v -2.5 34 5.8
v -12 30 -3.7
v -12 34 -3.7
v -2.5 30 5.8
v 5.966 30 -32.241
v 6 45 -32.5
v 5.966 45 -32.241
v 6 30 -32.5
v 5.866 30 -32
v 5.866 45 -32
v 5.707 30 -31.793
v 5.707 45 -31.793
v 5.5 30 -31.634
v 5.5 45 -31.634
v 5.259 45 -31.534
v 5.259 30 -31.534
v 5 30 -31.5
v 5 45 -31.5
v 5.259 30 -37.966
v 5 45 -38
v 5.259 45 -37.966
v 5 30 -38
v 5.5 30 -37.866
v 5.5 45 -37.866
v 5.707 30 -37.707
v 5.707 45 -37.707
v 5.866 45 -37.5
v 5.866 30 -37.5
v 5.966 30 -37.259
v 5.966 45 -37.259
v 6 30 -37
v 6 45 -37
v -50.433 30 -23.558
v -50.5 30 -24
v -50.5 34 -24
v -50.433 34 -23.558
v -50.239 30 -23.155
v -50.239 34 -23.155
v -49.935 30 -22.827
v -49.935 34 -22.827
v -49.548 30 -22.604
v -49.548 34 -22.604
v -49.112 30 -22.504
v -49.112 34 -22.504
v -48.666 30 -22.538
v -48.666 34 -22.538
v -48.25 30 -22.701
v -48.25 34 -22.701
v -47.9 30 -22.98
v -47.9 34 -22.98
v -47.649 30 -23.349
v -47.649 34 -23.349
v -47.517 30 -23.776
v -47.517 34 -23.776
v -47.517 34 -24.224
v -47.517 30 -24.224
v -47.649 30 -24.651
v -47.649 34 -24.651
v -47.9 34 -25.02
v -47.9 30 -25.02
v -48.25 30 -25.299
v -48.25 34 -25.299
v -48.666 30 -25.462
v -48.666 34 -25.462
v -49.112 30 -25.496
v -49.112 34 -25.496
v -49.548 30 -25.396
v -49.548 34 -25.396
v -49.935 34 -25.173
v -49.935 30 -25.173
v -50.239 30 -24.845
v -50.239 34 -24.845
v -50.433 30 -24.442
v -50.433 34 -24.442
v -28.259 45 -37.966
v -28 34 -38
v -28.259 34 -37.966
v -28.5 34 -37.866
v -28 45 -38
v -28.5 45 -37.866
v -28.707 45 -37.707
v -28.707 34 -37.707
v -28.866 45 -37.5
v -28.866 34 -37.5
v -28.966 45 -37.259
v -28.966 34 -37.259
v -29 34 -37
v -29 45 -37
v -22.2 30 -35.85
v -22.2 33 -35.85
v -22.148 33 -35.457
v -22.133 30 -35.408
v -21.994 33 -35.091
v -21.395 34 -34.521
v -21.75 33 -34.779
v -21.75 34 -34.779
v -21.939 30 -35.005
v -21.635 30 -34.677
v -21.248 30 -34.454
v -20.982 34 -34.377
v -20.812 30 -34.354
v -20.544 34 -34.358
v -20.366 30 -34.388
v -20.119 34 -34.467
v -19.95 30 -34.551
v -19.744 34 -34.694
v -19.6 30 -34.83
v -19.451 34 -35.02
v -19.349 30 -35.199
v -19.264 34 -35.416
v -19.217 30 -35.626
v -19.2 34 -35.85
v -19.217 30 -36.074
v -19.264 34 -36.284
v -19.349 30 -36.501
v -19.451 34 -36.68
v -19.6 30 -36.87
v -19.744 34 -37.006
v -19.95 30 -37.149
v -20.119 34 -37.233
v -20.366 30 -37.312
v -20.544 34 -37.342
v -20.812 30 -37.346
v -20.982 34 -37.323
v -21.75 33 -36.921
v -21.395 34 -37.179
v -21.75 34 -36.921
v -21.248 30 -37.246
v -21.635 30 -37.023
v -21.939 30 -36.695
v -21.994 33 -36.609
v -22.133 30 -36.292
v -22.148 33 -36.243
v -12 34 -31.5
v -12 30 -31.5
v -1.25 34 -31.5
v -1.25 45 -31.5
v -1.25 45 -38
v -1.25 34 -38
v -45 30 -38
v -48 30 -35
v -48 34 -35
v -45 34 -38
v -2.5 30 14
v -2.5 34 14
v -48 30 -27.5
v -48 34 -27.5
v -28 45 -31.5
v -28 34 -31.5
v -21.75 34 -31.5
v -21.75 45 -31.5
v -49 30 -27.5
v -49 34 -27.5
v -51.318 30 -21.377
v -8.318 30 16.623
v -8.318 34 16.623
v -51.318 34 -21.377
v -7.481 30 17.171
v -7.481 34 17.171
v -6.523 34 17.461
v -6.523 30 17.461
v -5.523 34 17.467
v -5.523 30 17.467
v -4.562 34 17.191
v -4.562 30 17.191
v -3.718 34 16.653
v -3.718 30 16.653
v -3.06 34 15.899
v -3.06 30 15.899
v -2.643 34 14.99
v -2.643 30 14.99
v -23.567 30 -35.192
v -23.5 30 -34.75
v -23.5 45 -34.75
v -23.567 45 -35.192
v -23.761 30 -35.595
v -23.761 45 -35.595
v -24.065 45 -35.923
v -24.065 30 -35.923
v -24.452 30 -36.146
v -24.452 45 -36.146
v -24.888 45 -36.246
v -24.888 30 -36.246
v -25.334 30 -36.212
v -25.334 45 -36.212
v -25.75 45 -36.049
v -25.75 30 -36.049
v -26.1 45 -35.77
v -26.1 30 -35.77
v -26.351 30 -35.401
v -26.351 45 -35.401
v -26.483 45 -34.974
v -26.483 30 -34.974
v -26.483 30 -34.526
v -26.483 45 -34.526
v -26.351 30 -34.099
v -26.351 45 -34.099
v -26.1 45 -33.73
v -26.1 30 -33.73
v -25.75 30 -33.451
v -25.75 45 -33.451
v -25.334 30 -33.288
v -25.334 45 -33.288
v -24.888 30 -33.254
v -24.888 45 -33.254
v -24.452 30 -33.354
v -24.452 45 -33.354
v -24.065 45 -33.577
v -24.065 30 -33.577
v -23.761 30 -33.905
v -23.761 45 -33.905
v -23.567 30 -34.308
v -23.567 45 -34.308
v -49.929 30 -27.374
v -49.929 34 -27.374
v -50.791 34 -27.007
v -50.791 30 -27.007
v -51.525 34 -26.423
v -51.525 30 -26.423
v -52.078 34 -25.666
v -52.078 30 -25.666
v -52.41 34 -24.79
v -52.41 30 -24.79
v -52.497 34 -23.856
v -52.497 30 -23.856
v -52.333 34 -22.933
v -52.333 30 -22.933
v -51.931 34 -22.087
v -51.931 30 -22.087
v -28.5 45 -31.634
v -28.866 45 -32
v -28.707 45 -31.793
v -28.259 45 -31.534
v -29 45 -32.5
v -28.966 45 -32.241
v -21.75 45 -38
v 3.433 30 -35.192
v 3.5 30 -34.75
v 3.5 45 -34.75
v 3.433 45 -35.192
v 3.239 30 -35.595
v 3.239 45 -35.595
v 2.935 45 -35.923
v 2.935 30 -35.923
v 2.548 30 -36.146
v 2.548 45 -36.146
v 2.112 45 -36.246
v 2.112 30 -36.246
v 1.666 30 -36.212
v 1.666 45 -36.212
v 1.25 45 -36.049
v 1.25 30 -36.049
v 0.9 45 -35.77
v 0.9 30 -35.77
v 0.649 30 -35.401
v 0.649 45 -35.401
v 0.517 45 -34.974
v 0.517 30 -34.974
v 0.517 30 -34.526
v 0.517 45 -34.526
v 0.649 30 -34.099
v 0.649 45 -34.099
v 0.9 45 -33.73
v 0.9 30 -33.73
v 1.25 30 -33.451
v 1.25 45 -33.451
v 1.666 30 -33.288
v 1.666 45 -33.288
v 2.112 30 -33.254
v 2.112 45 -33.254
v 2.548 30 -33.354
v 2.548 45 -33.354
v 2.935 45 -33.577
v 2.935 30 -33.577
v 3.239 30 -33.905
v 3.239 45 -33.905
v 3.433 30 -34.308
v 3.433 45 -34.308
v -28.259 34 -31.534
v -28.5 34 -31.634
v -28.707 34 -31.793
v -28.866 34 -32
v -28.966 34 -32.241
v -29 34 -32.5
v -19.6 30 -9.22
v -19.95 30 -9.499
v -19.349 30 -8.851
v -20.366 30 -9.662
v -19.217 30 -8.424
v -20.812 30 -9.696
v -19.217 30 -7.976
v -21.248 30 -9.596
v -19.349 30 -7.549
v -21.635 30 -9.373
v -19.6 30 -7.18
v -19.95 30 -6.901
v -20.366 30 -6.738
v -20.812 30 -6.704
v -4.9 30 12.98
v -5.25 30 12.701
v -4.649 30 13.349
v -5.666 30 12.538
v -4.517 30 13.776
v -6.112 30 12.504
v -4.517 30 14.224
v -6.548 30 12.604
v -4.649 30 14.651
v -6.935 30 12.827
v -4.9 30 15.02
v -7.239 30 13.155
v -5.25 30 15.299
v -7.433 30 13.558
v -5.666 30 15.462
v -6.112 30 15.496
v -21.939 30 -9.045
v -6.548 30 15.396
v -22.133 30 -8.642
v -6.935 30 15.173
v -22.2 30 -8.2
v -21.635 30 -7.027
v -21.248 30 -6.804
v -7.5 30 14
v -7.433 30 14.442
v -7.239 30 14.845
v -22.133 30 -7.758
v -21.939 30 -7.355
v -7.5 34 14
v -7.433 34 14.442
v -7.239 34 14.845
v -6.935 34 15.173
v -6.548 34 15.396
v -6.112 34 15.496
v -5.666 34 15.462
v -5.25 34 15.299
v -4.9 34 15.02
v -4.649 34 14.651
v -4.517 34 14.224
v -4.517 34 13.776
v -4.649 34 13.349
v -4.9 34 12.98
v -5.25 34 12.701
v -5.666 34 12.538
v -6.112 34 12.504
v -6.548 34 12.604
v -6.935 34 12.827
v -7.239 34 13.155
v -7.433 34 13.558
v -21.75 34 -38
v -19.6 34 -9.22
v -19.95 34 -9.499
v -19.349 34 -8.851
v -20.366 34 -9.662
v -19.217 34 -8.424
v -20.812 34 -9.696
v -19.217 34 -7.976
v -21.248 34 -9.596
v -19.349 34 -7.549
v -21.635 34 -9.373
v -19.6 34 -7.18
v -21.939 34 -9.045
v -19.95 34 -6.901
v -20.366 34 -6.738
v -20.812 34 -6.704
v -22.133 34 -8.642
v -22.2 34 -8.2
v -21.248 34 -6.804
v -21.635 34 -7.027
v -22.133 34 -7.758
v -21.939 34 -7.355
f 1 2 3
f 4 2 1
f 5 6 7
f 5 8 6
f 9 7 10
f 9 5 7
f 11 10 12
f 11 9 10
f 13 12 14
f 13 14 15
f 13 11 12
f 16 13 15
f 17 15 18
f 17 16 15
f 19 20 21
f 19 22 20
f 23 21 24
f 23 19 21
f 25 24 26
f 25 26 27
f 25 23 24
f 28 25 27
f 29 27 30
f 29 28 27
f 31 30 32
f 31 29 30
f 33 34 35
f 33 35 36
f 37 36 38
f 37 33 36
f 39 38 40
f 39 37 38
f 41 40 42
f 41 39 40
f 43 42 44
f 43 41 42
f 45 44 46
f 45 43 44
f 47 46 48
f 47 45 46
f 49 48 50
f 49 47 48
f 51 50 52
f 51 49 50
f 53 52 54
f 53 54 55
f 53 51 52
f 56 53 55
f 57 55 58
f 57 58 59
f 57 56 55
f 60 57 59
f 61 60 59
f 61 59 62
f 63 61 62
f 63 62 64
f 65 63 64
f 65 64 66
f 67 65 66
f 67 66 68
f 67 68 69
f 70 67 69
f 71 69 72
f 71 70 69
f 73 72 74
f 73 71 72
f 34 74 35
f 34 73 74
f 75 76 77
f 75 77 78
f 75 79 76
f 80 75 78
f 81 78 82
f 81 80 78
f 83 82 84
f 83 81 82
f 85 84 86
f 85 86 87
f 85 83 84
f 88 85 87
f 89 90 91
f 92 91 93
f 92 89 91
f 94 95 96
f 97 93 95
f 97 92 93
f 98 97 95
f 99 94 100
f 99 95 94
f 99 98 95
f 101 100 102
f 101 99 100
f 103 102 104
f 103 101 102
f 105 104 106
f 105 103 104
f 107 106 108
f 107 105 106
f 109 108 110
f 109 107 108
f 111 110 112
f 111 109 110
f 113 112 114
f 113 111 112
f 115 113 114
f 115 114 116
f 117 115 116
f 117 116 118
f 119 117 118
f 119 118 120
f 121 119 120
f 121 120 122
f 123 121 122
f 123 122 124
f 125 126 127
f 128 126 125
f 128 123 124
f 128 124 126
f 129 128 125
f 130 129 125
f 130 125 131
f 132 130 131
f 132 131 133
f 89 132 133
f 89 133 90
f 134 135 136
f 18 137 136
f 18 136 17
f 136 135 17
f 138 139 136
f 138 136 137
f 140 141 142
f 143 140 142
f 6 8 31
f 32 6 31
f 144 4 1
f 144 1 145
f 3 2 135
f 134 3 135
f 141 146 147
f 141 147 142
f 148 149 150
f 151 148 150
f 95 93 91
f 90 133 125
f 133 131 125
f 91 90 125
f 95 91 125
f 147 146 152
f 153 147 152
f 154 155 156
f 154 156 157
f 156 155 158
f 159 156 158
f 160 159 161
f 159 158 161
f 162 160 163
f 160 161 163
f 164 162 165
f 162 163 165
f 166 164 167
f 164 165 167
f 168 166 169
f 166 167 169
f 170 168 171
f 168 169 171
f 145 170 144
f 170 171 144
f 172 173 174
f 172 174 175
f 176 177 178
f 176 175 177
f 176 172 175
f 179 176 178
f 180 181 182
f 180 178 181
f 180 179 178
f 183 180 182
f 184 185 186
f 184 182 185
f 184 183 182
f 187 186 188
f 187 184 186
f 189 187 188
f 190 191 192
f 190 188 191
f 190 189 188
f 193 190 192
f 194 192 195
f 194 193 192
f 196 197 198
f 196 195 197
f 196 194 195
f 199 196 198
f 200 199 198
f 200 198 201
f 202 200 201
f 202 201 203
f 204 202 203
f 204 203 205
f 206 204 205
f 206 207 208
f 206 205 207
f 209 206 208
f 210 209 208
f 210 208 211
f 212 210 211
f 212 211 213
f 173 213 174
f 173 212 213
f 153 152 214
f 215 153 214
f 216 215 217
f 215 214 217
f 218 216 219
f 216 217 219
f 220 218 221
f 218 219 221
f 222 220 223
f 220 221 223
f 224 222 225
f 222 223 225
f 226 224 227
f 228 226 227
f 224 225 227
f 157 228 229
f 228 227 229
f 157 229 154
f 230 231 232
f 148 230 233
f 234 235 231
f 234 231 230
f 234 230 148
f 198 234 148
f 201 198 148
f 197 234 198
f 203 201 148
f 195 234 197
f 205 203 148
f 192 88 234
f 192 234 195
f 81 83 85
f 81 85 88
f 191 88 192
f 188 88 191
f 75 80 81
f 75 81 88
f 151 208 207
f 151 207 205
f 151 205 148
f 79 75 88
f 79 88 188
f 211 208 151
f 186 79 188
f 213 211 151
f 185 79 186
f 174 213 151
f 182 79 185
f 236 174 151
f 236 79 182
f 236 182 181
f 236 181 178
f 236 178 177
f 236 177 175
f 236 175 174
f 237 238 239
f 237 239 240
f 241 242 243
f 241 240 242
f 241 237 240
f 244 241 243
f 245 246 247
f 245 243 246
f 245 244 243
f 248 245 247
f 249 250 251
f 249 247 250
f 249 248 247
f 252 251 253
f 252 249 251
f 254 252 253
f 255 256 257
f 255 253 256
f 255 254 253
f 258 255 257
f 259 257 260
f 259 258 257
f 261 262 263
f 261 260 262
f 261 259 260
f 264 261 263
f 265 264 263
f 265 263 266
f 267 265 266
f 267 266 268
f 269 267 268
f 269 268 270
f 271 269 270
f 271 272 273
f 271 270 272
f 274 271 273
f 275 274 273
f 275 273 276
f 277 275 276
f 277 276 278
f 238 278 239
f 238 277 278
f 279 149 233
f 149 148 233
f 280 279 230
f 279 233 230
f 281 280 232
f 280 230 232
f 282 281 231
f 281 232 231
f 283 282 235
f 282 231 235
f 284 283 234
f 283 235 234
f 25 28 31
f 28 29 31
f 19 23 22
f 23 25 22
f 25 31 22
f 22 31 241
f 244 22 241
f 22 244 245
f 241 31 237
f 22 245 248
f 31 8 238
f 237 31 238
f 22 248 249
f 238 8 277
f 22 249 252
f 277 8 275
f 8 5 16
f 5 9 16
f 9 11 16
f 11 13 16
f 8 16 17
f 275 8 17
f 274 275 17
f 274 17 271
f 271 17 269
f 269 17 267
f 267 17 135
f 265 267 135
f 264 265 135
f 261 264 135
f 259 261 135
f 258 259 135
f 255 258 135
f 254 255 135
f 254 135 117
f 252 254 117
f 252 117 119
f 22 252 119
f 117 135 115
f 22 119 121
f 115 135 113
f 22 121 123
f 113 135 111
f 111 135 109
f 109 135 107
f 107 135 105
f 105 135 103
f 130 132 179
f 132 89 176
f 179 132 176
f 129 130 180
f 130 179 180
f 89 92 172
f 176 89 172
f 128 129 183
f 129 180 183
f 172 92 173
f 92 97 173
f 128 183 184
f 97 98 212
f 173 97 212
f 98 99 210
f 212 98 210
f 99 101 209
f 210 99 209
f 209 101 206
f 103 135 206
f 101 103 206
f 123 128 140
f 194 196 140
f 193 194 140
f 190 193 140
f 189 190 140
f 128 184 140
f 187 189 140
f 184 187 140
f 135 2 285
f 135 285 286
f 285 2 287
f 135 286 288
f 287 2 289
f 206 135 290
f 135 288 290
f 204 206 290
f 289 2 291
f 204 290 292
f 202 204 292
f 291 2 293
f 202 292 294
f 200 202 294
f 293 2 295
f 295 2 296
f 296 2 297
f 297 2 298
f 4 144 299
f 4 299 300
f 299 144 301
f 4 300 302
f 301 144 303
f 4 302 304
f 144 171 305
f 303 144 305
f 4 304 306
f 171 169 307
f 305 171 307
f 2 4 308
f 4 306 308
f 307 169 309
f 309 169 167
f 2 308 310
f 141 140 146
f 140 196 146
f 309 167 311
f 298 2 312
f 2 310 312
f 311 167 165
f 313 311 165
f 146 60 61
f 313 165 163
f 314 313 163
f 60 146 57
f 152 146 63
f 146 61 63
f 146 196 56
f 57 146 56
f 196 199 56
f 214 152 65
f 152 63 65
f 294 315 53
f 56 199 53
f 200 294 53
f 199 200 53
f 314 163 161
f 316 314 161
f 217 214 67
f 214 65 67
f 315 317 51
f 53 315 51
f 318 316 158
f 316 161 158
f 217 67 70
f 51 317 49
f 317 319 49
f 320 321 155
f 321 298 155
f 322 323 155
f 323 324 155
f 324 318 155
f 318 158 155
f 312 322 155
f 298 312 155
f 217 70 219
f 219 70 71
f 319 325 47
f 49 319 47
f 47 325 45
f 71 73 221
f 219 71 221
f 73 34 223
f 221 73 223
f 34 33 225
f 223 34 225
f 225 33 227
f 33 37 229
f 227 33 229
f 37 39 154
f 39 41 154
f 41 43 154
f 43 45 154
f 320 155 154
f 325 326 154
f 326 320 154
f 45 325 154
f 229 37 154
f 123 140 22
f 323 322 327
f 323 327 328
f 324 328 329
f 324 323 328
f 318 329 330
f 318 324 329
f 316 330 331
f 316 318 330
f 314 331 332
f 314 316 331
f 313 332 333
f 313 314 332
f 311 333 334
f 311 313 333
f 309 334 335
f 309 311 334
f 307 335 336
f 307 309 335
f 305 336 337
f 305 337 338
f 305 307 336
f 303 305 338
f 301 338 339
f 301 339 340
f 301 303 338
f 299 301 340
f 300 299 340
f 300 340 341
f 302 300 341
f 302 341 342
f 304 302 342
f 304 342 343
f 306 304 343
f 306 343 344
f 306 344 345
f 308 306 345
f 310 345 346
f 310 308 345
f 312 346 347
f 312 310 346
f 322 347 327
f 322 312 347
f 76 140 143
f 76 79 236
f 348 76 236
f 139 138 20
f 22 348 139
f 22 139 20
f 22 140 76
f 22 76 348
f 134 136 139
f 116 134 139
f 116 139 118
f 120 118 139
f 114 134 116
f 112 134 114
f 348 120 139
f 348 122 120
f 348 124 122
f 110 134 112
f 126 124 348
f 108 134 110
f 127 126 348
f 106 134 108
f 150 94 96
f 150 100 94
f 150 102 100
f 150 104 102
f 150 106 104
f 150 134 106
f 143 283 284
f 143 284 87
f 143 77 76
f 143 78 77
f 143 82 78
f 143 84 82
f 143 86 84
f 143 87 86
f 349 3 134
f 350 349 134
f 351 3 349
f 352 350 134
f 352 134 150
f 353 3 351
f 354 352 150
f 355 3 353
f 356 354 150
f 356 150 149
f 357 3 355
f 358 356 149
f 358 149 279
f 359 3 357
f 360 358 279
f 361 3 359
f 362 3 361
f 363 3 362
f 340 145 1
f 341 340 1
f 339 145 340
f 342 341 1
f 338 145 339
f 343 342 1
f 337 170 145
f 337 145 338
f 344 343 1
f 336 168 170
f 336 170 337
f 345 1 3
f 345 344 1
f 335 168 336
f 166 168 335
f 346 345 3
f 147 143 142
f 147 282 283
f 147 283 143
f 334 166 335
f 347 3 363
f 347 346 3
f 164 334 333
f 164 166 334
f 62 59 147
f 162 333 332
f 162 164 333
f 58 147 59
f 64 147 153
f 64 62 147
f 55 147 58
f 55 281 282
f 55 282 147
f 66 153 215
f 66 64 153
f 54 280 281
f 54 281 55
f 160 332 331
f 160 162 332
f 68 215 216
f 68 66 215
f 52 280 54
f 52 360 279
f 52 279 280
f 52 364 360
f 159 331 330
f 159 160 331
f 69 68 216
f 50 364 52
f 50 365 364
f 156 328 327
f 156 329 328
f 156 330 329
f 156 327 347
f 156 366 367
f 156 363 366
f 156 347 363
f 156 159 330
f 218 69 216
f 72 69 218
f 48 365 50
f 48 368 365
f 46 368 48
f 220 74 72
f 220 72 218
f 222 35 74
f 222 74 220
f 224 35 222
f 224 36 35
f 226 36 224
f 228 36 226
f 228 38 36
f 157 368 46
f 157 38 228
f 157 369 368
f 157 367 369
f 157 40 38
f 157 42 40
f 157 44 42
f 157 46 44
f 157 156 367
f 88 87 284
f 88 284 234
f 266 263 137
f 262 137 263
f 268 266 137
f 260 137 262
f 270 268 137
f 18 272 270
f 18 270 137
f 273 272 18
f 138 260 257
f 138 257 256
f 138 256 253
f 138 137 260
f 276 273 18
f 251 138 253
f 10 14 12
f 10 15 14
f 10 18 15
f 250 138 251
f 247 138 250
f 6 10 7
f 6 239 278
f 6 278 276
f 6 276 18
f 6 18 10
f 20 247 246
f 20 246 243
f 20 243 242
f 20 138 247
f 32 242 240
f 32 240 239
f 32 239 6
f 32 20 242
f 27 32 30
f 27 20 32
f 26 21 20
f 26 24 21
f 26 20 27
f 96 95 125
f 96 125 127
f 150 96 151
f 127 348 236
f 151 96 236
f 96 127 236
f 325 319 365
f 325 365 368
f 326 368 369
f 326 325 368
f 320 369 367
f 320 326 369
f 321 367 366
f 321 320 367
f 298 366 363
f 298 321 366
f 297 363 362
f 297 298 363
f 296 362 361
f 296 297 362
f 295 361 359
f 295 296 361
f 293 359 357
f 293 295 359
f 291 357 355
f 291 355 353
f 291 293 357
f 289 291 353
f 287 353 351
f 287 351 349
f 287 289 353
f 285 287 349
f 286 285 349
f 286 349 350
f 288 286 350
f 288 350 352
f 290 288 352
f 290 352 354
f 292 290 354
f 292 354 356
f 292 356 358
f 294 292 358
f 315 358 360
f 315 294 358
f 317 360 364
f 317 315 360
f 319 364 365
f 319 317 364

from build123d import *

# Parameters (mm, degrees)
CYLINDER035_R          = 1.5
CYLINDER035_DEPTH      = 30
CYLINDER035_ROLL_ANGLE = -90
CYLINDER034_R          = 1.5
CYLINDER034_DEPTH      = 30
CYLINDER034_ROLL_ANGLE = -90
BOX033_W               = 7.25
BOX033_H               = 12
BOX033_DEPTH           = 6.5
BOX032_W               = 7.25
BOX032_H               = 12
BOX032_DEPTH           = 6.5
SKETCH019_R            = 1.5
PAD017_DEPTH           = 4
FILLET027_R            = 1
CHAMFER008_SIZE        = 3


with BuildPart() as cylinder035:
    # Cylinder035 → Cylinder035 (new body)
    with BuildSketch(Plane.XY):
        Circle(CYLINDER035_R)
    extrude(amount=CYLINDER035_DEPTH)


with BuildPart() as cylinder035_1:
    # Cylinder035 roll: moved
    add(cylinder035.part.rotate(Axis((0, 0, 0), (1, 0, 0)), CYLINDER035_ROLL_ANGLE))


with BuildPart() as cylinder035_2:
    # Cylinder035 placement: moved
    add(cylinder035_1.part.moved(Location((-25, 27, -34.75))))


with BuildPart() as fusion031:
    # Cylinder034 → Cylinder034 (new body)
    with BuildSketch(Plane.XY):
        Circle(CYLINDER034_R)
    extrude(amount=CYLINDER034_DEPTH)


with BuildPart() as fusion031_1:
    # Cylinder034 roll: moved
    add(fusion031.part.rotate(Axis((0, 0, 0), (1, 0, 0)), CYLINDER034_ROLL_ANGLE))


with BuildPart() as fusion031_2:
    # Cylinder034 placement: moved
    add(fusion031_1.part.moved(Location((2, 27, -34.75))))

    # Fusion031: union Cylinder035
    add(cylinder035_2.part)


with BuildPart() as cube033:
    # Box033 → Box033 (new body)
    with BuildSketch(Plane(origin=(-29, 33, -38), x_dir=(1, 0, 0), z_dir=(0, 0, 1))):
        with Locations((3.625, 6)):
            Rectangle(BOX033_W, BOX033_H)
    extrude(amount=BOX033_DEPTH)


with BuildPart() as cube032:
    # Box032 → Box032 (new body)
    with BuildSketch(Plane(origin=(-1.25, 33, -38), x_dir=(1, 0, 0), z_dir=(0, 0, 1))):
        with Locations((3.625, 6)):
            Rectangle(BOX032_W, BOX032_H)
    extrude(amount=BOX032_DEPTH)


with BuildPart() as chamfer008:
    # Sketch019 → Pad017 (new body)
    with BuildSketch(Plane(origin=(0, 30, 0), x_dir=(-1, 0, 0), z_dir=(0, 1, 0))):
        with BuildLine():
            ThreePointArc((8.31768, 16.622663), (4.561577, 17.190758), (2.5, 13.999999))
            Line((2.5, 5.8), (2.5, 13.999999))
            Line((12, -3.7), (2.5, 5.8))
            Line((12, -3.7), (12, -31.5))
            Line((12, -31.5), (-6, -31.5))
            Line((-6, -31.5), (-6, -38))
            Line((48, -38), (-6, -38))
            Line((48, -27.5), (48, -38))
            Line((48, -27.5), (48.999996, -27.5))
            ThreePointArc((48.999996, -27.5), (52.273323, -25.239096), (51.317689, -21.377346))
            Line((8.31768, 16.622663), (51.317689, -21.377346))
        make_face()
        with Locations((6, 14)):
            Circle(SKETCH019_R, mode=Mode.SUBTRACT)
        with Locations((49, -24)):
            Circle(SKETCH019_R, mode=Mode.SUBTRACT)
        with Locations((20.7, -35.85)):
            Circle(SKETCH019_R, mode=Mode.SUBTRACT)
        with Locations((20.7, -8.2)):
            Circle(SKETCH019_R, mode=Mode.SUBTRACT)
    extrude(amount=PAD017_DEPTH)

    # Fusion030: union Cube033, Cube032
    add(cube033.part)
    add(cube032.part)

    # Fillet027
    fillet027_edges = [chamfer008.edges().sort_by_distance(p)[0] for p in [
        (-29, 39.5, -31.5),
        (-29, 39.5, -38),
        (6, 37.5, -38),
        (6, 37.5, -31.5),
    ]]
    fillet(fillet027_edges, radius=FILLET027_R)

    # Cut038: cut Fusion031
    add(fusion031_2.part, mode=Mode.SUBTRACT)

    # Chamfer008
    chamfer008_edges = [chamfer008.edges().sort_by_distance(p)[0] for p in [
        (-48, 32, -38),
    ]]
    chamfer(chamfer008_edges, length=CHAMFER008_SIZE)


solid = chamfer008.part
